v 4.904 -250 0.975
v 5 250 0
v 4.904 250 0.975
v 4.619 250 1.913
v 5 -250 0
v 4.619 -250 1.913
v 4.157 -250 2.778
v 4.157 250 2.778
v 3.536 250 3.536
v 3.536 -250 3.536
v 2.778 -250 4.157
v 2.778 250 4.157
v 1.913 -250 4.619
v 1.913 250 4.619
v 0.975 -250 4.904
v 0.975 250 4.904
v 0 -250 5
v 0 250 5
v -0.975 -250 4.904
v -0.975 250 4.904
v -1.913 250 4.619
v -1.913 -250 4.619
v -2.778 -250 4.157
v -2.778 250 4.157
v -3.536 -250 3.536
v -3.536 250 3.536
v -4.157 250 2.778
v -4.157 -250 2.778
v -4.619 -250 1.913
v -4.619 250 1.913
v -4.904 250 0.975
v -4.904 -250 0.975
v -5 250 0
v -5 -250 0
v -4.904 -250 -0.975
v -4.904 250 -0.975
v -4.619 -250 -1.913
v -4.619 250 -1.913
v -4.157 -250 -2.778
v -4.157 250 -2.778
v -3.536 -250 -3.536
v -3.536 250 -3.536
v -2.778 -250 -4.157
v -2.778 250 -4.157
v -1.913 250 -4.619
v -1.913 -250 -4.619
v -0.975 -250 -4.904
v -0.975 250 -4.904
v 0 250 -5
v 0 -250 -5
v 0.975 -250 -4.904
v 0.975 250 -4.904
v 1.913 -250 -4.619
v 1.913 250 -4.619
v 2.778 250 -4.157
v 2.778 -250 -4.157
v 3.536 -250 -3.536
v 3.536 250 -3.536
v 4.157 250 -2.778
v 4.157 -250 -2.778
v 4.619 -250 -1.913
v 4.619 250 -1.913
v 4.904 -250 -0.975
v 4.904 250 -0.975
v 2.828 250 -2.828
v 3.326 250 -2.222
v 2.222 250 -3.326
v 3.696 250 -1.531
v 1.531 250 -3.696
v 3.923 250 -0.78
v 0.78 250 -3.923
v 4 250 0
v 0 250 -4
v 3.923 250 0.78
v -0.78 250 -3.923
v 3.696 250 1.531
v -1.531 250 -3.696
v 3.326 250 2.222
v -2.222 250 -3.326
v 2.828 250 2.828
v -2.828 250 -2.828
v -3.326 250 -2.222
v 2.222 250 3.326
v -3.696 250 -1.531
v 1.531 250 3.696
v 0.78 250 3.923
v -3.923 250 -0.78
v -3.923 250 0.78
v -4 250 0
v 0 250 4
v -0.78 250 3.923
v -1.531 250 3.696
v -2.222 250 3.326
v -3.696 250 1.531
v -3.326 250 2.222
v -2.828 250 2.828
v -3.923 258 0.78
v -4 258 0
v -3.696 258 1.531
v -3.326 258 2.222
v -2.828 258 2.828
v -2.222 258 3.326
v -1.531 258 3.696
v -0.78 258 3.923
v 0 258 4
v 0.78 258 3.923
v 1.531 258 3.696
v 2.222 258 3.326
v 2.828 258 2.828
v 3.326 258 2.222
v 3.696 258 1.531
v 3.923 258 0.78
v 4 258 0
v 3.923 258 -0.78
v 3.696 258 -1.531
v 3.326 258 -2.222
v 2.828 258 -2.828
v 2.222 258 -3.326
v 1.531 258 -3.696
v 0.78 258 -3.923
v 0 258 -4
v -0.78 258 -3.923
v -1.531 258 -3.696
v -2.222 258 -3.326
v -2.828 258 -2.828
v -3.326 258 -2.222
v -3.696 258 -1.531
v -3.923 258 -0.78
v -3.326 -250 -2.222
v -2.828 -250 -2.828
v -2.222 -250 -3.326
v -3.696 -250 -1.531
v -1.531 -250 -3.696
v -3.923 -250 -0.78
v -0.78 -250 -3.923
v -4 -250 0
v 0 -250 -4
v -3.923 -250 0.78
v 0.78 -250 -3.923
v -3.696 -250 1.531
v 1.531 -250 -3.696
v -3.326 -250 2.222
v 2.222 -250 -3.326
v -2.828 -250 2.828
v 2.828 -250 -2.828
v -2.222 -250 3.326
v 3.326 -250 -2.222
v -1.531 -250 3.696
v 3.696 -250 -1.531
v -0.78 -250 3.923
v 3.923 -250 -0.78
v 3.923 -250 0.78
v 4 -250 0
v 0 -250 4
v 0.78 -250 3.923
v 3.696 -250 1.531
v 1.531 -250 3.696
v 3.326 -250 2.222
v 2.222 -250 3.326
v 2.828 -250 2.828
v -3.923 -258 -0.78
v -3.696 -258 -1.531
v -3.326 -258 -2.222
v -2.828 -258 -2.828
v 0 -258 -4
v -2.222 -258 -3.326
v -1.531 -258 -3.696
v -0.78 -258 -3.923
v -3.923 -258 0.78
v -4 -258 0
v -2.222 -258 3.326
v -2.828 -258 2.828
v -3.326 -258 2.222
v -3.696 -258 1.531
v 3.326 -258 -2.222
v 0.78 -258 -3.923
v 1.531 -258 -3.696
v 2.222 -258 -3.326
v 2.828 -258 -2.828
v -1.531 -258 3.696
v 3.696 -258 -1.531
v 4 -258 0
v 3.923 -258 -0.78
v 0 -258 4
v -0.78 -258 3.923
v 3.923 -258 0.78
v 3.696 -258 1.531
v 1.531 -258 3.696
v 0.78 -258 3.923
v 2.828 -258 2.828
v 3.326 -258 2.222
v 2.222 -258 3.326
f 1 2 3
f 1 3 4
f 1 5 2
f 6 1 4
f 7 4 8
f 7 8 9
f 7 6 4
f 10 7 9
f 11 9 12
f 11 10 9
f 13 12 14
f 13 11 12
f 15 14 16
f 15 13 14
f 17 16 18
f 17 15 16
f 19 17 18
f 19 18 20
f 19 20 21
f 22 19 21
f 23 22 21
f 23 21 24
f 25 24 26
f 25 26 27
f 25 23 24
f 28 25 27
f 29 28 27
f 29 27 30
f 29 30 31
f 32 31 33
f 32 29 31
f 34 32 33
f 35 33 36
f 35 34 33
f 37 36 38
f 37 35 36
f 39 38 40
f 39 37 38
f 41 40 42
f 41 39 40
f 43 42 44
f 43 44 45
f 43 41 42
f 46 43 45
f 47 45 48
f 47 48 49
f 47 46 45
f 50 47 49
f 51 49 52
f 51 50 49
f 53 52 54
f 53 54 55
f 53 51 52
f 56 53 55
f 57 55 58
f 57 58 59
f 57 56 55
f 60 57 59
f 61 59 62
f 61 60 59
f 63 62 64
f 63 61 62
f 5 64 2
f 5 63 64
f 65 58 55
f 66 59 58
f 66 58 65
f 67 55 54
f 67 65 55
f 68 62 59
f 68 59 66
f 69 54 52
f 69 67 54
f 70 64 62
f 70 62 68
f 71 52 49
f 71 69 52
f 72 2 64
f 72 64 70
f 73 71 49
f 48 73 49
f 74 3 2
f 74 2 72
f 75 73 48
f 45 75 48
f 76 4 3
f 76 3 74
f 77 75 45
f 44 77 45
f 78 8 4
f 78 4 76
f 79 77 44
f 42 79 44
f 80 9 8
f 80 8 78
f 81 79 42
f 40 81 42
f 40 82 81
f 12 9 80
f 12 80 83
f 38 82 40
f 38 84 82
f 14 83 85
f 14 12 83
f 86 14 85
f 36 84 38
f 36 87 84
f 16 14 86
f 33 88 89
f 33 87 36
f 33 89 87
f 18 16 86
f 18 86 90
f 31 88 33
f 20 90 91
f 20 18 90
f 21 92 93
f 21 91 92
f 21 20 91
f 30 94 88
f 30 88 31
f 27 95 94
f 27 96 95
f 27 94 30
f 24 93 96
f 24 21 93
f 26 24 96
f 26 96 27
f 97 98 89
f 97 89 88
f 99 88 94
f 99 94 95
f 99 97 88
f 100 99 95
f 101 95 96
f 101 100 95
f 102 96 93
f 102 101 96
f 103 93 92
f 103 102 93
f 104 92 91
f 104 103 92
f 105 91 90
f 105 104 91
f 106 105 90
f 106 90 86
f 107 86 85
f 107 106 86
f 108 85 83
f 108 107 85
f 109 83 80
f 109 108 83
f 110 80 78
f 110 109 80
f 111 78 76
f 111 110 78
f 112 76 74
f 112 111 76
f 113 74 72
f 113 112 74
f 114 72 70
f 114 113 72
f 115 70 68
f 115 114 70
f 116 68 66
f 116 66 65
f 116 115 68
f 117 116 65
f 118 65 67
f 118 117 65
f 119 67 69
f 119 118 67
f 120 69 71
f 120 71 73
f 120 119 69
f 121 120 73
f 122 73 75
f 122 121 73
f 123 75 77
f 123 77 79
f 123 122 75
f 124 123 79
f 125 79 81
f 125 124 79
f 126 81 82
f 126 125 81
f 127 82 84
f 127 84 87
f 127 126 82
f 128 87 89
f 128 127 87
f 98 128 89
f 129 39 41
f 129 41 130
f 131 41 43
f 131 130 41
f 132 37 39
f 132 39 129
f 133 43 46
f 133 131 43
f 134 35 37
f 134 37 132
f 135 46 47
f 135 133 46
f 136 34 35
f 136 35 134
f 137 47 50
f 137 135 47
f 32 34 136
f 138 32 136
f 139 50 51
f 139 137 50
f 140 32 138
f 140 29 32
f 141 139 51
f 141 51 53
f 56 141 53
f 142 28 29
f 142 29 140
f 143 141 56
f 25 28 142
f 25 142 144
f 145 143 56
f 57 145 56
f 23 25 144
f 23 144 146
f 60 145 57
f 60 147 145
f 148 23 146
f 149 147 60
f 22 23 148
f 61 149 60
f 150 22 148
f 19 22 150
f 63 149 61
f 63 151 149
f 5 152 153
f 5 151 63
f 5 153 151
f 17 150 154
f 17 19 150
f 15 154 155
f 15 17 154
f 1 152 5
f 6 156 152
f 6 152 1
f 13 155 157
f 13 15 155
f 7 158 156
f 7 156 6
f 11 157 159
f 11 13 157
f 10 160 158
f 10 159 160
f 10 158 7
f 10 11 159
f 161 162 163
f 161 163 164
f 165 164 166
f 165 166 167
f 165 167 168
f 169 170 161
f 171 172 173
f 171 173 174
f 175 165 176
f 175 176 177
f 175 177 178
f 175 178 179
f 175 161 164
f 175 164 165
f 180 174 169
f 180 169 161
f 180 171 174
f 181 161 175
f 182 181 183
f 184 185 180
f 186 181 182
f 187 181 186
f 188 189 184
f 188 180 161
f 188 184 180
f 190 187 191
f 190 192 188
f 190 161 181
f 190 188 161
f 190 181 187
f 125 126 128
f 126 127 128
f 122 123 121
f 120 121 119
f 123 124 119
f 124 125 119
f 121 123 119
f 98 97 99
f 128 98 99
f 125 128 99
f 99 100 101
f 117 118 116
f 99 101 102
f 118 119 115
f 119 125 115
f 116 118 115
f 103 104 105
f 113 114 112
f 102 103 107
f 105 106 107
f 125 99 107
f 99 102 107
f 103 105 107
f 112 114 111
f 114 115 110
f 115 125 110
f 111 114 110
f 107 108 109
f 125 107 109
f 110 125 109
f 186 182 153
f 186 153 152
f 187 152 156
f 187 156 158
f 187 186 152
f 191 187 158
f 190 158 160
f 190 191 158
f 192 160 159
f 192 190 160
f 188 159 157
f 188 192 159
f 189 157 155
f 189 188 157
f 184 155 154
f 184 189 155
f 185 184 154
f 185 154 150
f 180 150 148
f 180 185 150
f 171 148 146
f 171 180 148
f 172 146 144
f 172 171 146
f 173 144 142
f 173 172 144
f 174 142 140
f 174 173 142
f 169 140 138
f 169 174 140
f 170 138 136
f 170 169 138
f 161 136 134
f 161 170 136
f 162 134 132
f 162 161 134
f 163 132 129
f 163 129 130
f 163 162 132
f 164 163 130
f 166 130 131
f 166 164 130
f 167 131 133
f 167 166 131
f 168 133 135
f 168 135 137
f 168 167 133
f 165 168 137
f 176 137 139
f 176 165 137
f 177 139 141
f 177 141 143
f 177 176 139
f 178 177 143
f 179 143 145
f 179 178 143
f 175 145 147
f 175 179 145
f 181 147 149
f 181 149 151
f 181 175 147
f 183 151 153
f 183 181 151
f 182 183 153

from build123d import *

# Parameters (mm, degrees)
F0_R     = 5
F1_DEPTH = 258
F2_R     = 9
F2_R_2   = 4
F3_DEPTH = 8
F4_R     = 5
F4_R_2   = 4
F5_DEPTH = 8


with BuildPart() as f1:
    # F0 (on Front) → F1 (new body, symmetric)
    with BuildSketch(Plane.XZ):
        Circle(F0_R)
    extrude(amount=F1_DEPTH, both=True)

    # F2 (on face) → F3 (cut)
    with BuildSketch(Plane.XZ.offset(258)):
        Circle(F2_R)
        Circle(F2_R_2, mode=Mode.SUBTRACT)
    extrude(amount=-F3_DEPTH, mode=Mode.SUBTRACT)

    # F4 (on face) → F5 (cut)
    with BuildSketch(Plane(origin=(0, 258, 0), x_dir=(-1, 0, 0), z_dir=(0, 1, 0))):
        Circle(F4_R)
        Circle(F4_R_2, mode=Mode.SUBTRACT)
    extrude(amount=-F5_DEPTH, mode=Mode.SUBTRACT)


solid = f1.part
